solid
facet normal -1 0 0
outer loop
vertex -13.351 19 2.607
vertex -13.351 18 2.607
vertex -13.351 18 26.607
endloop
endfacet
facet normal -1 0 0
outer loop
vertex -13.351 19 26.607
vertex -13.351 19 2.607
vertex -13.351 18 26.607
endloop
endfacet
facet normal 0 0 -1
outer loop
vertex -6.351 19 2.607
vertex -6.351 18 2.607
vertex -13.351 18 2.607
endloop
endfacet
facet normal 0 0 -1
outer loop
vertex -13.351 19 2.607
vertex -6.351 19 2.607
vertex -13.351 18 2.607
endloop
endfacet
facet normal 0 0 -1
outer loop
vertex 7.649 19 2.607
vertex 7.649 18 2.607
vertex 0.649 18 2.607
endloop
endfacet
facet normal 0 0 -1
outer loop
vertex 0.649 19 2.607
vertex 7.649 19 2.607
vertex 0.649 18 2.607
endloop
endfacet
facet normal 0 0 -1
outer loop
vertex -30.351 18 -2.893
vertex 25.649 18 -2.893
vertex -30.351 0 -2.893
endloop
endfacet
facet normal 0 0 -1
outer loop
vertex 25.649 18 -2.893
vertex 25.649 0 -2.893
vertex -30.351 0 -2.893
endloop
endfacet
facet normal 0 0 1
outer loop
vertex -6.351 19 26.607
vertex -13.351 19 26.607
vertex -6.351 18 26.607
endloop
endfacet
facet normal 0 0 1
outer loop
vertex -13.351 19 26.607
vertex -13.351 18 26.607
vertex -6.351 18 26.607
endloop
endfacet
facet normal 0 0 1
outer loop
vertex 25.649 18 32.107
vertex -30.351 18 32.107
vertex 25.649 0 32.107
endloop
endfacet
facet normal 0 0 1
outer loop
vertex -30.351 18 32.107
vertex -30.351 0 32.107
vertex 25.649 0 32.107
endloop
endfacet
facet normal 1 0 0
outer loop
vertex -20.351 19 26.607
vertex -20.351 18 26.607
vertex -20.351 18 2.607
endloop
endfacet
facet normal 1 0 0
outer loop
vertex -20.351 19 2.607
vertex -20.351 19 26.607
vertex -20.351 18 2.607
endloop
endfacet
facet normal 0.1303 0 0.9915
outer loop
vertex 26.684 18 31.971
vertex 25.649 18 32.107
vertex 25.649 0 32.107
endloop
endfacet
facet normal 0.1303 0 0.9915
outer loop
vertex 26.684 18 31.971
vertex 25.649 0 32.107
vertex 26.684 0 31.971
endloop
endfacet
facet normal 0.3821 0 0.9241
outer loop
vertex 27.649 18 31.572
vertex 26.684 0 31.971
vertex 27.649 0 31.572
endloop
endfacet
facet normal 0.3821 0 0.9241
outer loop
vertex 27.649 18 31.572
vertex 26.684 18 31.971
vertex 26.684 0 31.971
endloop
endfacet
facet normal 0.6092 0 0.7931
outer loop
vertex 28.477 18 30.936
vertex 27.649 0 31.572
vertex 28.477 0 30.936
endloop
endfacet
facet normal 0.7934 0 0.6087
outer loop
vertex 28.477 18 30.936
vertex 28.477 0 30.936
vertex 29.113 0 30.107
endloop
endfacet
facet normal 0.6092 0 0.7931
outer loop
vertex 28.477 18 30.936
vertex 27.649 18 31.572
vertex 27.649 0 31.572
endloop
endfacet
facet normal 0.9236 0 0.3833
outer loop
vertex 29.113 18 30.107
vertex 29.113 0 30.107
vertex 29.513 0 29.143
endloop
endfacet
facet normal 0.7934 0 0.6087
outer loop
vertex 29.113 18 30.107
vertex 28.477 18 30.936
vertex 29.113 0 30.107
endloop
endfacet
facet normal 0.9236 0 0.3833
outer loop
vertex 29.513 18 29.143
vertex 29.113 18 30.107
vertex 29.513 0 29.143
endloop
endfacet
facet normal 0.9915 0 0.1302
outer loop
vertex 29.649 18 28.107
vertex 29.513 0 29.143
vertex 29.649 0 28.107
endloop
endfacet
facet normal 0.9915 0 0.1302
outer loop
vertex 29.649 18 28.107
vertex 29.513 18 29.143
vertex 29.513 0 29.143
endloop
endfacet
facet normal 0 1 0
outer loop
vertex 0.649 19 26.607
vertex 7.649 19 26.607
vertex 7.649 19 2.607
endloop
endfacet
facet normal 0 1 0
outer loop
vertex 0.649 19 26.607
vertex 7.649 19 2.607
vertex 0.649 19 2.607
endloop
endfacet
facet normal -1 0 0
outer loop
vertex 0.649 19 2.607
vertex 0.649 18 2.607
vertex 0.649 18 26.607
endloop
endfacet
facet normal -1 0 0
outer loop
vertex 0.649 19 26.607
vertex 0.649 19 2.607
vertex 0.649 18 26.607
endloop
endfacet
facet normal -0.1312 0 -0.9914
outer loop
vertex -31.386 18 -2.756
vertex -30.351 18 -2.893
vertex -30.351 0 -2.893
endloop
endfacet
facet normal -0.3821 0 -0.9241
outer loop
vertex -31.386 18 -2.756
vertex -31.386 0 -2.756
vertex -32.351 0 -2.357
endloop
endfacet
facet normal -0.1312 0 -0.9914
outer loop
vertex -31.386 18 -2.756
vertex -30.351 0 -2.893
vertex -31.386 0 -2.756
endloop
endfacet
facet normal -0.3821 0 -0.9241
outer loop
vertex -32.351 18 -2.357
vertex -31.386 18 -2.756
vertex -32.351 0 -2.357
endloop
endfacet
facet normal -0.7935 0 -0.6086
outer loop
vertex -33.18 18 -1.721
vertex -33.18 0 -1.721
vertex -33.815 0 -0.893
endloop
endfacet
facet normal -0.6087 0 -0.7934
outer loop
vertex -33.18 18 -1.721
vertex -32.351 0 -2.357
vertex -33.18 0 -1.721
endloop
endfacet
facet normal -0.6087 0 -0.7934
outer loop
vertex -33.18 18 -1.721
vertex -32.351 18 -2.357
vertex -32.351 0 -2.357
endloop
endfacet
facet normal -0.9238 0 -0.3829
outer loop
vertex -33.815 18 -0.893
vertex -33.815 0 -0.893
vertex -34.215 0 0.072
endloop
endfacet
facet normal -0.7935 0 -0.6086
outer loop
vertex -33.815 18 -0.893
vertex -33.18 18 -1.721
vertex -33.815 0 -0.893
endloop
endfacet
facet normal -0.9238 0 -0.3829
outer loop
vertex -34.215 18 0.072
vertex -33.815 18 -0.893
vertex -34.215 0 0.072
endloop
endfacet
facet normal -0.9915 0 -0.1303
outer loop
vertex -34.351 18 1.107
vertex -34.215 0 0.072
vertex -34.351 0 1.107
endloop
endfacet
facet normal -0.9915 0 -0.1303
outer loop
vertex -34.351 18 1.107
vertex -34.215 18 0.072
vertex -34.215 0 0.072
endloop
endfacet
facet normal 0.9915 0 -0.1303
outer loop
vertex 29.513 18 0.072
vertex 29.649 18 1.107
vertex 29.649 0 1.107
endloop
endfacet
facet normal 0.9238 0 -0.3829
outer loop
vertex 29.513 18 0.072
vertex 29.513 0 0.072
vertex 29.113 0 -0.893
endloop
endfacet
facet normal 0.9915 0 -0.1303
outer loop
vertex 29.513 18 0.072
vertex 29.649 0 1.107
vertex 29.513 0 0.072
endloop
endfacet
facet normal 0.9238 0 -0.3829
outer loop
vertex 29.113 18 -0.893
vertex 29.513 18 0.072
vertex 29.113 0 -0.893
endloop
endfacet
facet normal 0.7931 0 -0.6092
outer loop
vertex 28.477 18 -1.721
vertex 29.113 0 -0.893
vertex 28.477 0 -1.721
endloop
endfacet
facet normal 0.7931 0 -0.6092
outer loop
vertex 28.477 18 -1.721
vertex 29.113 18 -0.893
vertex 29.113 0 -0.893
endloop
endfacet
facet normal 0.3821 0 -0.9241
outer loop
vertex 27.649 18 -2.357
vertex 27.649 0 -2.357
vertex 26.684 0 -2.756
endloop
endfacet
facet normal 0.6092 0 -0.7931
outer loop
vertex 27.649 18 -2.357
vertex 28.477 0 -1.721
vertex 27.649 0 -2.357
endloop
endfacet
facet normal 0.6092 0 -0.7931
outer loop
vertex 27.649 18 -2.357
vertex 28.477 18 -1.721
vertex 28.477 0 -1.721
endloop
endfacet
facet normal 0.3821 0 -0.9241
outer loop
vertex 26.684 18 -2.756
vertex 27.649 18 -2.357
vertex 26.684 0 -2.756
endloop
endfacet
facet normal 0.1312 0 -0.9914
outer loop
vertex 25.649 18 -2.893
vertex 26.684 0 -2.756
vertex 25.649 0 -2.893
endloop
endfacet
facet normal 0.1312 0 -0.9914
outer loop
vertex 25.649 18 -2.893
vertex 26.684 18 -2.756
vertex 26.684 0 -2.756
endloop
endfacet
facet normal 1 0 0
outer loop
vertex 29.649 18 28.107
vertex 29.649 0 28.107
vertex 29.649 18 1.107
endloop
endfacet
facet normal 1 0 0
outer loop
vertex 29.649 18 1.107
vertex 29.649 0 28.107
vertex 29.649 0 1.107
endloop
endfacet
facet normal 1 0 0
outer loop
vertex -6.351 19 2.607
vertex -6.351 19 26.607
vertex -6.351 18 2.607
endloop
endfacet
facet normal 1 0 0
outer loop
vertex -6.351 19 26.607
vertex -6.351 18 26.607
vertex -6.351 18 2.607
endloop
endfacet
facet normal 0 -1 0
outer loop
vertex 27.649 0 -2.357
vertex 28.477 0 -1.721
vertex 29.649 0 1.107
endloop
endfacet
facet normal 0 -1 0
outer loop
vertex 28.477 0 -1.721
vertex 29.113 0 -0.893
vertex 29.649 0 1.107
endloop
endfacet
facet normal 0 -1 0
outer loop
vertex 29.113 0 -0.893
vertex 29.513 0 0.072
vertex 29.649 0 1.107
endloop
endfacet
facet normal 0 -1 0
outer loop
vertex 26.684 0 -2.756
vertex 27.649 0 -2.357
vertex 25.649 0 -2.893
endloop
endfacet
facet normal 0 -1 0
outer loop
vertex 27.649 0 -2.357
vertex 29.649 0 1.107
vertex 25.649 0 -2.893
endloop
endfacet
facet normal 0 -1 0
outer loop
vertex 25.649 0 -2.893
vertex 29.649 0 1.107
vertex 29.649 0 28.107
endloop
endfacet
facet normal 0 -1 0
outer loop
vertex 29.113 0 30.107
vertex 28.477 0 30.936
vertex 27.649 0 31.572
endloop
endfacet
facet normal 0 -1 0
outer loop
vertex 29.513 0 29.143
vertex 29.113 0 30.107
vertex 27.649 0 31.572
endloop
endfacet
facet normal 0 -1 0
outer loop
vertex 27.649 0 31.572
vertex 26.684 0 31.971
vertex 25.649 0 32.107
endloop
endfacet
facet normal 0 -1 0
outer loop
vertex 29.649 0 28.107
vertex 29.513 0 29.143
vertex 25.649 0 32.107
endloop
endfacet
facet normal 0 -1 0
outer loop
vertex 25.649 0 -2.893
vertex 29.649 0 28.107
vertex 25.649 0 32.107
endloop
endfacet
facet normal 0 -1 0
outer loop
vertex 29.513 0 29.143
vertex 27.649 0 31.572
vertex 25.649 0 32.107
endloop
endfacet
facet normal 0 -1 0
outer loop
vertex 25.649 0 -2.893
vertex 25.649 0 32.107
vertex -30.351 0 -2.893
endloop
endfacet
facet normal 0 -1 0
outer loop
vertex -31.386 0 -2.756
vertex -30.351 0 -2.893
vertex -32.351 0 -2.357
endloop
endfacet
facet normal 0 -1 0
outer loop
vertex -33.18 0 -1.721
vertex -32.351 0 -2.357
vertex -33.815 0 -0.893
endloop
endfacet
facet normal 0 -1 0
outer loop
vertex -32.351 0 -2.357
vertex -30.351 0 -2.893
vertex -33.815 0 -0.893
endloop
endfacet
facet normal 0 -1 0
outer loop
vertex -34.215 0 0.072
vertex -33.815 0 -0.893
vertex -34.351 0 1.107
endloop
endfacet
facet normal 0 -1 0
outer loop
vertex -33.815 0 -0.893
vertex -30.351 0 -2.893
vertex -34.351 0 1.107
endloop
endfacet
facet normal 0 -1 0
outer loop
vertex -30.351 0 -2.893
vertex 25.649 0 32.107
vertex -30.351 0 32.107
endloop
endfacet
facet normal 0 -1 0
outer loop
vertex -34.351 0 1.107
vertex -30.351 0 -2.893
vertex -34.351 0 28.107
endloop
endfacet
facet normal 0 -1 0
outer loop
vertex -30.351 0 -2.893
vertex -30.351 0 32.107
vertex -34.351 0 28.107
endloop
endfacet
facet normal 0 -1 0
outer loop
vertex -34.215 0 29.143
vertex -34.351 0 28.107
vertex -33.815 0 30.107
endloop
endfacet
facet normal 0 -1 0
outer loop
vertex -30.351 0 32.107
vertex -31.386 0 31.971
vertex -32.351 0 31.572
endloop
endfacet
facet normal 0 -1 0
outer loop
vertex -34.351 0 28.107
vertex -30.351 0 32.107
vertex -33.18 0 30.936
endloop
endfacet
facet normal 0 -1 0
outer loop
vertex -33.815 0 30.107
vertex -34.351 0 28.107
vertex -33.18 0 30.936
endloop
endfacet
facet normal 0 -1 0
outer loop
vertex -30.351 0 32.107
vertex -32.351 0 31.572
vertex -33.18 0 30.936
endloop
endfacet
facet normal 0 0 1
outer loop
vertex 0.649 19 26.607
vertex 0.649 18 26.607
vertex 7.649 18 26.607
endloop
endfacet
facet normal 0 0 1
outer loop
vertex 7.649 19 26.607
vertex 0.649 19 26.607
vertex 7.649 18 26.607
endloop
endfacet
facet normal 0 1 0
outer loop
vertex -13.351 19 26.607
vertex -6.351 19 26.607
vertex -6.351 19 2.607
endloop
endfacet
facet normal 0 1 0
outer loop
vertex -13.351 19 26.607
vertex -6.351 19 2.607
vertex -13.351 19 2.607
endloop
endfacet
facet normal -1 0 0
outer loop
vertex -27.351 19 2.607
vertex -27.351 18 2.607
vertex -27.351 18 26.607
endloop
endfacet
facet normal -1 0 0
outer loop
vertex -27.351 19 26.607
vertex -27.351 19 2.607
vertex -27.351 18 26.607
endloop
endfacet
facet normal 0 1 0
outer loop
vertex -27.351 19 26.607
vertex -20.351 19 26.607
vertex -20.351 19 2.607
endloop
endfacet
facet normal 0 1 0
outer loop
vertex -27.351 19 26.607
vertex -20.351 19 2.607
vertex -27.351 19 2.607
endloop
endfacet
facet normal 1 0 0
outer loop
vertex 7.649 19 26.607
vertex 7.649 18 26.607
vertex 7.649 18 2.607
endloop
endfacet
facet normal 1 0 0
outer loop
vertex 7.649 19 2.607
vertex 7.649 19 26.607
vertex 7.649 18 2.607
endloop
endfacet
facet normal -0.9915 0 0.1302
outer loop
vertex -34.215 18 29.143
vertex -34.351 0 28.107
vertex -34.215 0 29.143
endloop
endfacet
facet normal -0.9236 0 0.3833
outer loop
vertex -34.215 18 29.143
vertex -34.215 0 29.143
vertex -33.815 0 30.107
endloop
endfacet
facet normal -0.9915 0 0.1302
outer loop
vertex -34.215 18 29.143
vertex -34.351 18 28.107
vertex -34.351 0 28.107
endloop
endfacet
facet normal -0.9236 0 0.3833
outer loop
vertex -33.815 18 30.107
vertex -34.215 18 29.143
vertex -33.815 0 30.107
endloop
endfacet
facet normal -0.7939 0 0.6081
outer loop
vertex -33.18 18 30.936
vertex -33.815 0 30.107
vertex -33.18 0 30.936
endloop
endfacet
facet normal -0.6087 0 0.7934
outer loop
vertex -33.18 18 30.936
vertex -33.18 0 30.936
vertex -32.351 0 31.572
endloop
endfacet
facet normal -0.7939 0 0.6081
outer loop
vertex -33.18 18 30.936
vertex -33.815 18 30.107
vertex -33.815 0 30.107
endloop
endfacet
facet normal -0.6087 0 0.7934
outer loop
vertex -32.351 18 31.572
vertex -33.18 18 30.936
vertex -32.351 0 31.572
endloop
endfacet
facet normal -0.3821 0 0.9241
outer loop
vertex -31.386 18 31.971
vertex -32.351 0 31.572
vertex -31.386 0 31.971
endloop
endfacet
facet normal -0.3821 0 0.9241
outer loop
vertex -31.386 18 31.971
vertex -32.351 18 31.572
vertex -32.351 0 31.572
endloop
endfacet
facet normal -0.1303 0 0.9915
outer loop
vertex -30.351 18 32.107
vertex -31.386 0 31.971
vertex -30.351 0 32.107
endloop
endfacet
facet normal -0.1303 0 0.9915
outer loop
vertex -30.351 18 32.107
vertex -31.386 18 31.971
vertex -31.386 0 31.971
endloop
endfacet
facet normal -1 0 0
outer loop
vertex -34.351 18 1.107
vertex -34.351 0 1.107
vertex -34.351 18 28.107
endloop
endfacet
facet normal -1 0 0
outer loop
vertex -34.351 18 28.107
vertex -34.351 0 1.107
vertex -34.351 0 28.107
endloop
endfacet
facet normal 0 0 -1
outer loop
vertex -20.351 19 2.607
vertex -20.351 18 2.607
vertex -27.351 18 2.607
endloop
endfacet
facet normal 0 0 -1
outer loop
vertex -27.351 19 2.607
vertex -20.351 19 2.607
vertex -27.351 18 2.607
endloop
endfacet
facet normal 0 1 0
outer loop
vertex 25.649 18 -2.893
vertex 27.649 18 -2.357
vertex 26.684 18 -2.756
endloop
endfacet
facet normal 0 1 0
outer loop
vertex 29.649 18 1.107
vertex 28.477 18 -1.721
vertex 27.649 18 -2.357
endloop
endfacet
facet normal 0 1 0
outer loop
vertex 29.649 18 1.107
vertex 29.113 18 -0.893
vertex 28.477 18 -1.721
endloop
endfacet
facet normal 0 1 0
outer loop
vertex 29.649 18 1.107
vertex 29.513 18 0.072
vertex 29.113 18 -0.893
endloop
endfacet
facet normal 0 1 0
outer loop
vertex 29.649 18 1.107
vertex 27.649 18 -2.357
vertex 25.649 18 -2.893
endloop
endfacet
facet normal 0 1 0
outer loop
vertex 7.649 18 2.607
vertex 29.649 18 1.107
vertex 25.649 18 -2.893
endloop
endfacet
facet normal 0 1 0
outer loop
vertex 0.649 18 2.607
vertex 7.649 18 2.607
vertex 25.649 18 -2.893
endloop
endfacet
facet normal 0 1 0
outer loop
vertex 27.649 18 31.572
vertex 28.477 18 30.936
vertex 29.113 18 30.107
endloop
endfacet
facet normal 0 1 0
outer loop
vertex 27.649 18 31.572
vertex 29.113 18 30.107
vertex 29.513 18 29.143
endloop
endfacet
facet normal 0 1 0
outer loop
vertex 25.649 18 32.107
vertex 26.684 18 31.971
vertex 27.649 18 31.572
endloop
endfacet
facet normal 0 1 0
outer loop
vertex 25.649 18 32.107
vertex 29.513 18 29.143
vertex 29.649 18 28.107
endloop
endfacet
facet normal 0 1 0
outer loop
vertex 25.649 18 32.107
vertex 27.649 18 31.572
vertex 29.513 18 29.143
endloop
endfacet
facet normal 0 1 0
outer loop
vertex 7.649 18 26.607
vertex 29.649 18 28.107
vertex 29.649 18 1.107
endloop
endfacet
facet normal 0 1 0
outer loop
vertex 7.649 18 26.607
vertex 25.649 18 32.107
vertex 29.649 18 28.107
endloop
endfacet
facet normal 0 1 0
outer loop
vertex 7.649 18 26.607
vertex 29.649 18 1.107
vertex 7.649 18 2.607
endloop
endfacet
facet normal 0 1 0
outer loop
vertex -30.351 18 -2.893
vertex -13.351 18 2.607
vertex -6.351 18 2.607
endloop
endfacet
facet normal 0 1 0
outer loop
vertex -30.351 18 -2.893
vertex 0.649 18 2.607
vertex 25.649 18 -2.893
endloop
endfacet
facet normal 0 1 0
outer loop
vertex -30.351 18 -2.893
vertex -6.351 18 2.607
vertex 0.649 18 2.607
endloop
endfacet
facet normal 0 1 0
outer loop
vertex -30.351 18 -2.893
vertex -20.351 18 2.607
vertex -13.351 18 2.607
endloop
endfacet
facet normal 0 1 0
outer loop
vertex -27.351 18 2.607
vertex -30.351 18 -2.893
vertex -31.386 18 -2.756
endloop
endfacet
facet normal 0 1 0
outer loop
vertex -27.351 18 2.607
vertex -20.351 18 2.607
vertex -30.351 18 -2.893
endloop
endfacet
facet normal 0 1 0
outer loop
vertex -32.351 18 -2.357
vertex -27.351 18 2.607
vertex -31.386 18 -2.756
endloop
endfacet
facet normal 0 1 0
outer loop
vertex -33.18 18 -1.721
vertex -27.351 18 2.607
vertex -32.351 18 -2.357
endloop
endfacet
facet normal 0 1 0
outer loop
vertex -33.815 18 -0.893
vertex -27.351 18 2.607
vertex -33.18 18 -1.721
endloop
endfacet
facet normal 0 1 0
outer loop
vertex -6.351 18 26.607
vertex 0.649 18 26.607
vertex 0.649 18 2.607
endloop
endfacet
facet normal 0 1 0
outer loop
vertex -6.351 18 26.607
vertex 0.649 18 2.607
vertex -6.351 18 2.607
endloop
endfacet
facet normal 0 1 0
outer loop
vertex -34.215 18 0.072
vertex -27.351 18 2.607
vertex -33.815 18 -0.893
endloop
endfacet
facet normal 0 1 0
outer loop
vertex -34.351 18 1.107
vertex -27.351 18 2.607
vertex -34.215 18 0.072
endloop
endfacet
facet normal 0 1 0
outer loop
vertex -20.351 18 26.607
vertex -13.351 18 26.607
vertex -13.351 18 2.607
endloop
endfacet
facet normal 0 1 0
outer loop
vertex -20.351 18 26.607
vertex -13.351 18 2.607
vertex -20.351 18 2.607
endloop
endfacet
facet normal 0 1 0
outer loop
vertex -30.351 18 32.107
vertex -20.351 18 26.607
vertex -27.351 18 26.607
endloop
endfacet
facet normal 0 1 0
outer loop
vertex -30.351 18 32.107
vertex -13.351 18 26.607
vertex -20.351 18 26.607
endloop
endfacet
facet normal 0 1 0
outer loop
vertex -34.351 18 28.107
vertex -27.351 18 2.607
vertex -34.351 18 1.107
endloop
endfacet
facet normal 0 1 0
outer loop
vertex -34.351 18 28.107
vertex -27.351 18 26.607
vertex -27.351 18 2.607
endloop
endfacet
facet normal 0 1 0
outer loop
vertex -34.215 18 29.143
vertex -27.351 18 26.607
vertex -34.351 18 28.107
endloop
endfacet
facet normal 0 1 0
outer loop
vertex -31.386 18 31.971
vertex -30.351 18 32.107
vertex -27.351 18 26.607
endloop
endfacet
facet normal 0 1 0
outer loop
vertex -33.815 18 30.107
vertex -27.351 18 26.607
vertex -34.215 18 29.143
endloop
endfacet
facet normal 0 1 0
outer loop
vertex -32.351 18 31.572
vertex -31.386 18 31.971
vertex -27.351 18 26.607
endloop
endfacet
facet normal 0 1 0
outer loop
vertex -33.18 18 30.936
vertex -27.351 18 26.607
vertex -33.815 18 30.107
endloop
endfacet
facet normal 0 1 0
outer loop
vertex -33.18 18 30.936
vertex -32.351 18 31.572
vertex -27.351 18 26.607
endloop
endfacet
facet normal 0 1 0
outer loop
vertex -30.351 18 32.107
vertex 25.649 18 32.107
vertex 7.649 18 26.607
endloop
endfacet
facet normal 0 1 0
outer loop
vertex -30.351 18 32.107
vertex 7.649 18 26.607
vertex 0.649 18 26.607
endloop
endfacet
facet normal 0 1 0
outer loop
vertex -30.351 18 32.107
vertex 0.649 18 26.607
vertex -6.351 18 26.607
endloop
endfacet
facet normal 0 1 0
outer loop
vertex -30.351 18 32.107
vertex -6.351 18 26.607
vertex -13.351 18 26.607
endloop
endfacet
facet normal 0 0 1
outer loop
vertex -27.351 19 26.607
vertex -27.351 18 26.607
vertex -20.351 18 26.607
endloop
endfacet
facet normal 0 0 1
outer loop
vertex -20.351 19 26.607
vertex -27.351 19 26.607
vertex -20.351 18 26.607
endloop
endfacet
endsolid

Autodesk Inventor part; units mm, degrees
ref_plane "YZ Plane" through (0, 0, 0) normal (1, 0, 0) x (0, 1, 0)
ref_plane "XZ Plane" through (0, 0, 0) normal (0, 1, 0) x (-1, 0, 0)
ref_plane "XY Plane" through (0, 0, 0) normal (0, 0, 1) x (1, 0, 0)
sketch "Sketch1" plane through (0, 0, 0) normal (0, 1, 0) x (-1, 0, 0)
  line L0 (34.3512, 32.1074) -> (-29.6488, 32.1074)
  line L1 (-29.6488, 32.1074) -> (-29.6488, -2.8926)
  line L2 (-29.6488, -2.8926) -> (34.3512, -2.8926)
  line L3 (34.3512, -2.8926) -> (34.3512, 32.1074)
  line L4 (27.3512, 26.6074) -> (20.3512, 26.6074)
  line L5 (20.3512, 26.6074) -> (20.3512, 2.6074)
  line L6 (20.3512, 2.6074) -> (27.3512, 2.6074)
  line L7 (27.3512, 2.6074) -> (27.3512, 26.6074)
  line L8 (13.3512, 2.6074) -> (13.3512, 26.6074)
  line L9 (13.3512, 26.6074) -> (6.3512, 26.6074)
  line L10 (6.3512, 2.6074) -> (13.3512, 2.6074)
  line L11 (6.3512, 26.6074) -> (6.3512, 2.6074)
  line L12 (-0.6488, 2.6074) -> (-0.6488, 26.6074)
  line L13 (-0.6488, 26.6074) -> (-7.6488, 26.6074)
  line L14 (-7.6488, 2.6074) -> (-0.6488, 2.6074)
  line L15 (-7.6488, 26.6074) -> (-7.6488, 2.6074)
  point P0 (0, 0)
  dimension "d0" = 35
  dimension "d1" = 64
  dimension "d2" = 7
  dimension "d3" = 7
  dimension "d4" = 24
  dimension "d5" = 5.5
  dimension "d6" = 5.5
  dimension "d9" = 14
  dimension "d14" = 7
extrude "Extrusion1" add sketch "Sketch1" along normal blind 18
extrude "Extrusion2" add sketch "Sketch1" along normal blind 19 contours L7 L6 L5 L4 | L10 L11 L9 L8 | L14 L15 L13 L12
fillet "Fillet1" radius 4 4 edges at (-34.3512, 9, -2.8926) (-34.3512, 9, 32.1074) (29.6488, 9, -2.8926) (29.6488, 9, 32.1074)
properties part number "kluc"
